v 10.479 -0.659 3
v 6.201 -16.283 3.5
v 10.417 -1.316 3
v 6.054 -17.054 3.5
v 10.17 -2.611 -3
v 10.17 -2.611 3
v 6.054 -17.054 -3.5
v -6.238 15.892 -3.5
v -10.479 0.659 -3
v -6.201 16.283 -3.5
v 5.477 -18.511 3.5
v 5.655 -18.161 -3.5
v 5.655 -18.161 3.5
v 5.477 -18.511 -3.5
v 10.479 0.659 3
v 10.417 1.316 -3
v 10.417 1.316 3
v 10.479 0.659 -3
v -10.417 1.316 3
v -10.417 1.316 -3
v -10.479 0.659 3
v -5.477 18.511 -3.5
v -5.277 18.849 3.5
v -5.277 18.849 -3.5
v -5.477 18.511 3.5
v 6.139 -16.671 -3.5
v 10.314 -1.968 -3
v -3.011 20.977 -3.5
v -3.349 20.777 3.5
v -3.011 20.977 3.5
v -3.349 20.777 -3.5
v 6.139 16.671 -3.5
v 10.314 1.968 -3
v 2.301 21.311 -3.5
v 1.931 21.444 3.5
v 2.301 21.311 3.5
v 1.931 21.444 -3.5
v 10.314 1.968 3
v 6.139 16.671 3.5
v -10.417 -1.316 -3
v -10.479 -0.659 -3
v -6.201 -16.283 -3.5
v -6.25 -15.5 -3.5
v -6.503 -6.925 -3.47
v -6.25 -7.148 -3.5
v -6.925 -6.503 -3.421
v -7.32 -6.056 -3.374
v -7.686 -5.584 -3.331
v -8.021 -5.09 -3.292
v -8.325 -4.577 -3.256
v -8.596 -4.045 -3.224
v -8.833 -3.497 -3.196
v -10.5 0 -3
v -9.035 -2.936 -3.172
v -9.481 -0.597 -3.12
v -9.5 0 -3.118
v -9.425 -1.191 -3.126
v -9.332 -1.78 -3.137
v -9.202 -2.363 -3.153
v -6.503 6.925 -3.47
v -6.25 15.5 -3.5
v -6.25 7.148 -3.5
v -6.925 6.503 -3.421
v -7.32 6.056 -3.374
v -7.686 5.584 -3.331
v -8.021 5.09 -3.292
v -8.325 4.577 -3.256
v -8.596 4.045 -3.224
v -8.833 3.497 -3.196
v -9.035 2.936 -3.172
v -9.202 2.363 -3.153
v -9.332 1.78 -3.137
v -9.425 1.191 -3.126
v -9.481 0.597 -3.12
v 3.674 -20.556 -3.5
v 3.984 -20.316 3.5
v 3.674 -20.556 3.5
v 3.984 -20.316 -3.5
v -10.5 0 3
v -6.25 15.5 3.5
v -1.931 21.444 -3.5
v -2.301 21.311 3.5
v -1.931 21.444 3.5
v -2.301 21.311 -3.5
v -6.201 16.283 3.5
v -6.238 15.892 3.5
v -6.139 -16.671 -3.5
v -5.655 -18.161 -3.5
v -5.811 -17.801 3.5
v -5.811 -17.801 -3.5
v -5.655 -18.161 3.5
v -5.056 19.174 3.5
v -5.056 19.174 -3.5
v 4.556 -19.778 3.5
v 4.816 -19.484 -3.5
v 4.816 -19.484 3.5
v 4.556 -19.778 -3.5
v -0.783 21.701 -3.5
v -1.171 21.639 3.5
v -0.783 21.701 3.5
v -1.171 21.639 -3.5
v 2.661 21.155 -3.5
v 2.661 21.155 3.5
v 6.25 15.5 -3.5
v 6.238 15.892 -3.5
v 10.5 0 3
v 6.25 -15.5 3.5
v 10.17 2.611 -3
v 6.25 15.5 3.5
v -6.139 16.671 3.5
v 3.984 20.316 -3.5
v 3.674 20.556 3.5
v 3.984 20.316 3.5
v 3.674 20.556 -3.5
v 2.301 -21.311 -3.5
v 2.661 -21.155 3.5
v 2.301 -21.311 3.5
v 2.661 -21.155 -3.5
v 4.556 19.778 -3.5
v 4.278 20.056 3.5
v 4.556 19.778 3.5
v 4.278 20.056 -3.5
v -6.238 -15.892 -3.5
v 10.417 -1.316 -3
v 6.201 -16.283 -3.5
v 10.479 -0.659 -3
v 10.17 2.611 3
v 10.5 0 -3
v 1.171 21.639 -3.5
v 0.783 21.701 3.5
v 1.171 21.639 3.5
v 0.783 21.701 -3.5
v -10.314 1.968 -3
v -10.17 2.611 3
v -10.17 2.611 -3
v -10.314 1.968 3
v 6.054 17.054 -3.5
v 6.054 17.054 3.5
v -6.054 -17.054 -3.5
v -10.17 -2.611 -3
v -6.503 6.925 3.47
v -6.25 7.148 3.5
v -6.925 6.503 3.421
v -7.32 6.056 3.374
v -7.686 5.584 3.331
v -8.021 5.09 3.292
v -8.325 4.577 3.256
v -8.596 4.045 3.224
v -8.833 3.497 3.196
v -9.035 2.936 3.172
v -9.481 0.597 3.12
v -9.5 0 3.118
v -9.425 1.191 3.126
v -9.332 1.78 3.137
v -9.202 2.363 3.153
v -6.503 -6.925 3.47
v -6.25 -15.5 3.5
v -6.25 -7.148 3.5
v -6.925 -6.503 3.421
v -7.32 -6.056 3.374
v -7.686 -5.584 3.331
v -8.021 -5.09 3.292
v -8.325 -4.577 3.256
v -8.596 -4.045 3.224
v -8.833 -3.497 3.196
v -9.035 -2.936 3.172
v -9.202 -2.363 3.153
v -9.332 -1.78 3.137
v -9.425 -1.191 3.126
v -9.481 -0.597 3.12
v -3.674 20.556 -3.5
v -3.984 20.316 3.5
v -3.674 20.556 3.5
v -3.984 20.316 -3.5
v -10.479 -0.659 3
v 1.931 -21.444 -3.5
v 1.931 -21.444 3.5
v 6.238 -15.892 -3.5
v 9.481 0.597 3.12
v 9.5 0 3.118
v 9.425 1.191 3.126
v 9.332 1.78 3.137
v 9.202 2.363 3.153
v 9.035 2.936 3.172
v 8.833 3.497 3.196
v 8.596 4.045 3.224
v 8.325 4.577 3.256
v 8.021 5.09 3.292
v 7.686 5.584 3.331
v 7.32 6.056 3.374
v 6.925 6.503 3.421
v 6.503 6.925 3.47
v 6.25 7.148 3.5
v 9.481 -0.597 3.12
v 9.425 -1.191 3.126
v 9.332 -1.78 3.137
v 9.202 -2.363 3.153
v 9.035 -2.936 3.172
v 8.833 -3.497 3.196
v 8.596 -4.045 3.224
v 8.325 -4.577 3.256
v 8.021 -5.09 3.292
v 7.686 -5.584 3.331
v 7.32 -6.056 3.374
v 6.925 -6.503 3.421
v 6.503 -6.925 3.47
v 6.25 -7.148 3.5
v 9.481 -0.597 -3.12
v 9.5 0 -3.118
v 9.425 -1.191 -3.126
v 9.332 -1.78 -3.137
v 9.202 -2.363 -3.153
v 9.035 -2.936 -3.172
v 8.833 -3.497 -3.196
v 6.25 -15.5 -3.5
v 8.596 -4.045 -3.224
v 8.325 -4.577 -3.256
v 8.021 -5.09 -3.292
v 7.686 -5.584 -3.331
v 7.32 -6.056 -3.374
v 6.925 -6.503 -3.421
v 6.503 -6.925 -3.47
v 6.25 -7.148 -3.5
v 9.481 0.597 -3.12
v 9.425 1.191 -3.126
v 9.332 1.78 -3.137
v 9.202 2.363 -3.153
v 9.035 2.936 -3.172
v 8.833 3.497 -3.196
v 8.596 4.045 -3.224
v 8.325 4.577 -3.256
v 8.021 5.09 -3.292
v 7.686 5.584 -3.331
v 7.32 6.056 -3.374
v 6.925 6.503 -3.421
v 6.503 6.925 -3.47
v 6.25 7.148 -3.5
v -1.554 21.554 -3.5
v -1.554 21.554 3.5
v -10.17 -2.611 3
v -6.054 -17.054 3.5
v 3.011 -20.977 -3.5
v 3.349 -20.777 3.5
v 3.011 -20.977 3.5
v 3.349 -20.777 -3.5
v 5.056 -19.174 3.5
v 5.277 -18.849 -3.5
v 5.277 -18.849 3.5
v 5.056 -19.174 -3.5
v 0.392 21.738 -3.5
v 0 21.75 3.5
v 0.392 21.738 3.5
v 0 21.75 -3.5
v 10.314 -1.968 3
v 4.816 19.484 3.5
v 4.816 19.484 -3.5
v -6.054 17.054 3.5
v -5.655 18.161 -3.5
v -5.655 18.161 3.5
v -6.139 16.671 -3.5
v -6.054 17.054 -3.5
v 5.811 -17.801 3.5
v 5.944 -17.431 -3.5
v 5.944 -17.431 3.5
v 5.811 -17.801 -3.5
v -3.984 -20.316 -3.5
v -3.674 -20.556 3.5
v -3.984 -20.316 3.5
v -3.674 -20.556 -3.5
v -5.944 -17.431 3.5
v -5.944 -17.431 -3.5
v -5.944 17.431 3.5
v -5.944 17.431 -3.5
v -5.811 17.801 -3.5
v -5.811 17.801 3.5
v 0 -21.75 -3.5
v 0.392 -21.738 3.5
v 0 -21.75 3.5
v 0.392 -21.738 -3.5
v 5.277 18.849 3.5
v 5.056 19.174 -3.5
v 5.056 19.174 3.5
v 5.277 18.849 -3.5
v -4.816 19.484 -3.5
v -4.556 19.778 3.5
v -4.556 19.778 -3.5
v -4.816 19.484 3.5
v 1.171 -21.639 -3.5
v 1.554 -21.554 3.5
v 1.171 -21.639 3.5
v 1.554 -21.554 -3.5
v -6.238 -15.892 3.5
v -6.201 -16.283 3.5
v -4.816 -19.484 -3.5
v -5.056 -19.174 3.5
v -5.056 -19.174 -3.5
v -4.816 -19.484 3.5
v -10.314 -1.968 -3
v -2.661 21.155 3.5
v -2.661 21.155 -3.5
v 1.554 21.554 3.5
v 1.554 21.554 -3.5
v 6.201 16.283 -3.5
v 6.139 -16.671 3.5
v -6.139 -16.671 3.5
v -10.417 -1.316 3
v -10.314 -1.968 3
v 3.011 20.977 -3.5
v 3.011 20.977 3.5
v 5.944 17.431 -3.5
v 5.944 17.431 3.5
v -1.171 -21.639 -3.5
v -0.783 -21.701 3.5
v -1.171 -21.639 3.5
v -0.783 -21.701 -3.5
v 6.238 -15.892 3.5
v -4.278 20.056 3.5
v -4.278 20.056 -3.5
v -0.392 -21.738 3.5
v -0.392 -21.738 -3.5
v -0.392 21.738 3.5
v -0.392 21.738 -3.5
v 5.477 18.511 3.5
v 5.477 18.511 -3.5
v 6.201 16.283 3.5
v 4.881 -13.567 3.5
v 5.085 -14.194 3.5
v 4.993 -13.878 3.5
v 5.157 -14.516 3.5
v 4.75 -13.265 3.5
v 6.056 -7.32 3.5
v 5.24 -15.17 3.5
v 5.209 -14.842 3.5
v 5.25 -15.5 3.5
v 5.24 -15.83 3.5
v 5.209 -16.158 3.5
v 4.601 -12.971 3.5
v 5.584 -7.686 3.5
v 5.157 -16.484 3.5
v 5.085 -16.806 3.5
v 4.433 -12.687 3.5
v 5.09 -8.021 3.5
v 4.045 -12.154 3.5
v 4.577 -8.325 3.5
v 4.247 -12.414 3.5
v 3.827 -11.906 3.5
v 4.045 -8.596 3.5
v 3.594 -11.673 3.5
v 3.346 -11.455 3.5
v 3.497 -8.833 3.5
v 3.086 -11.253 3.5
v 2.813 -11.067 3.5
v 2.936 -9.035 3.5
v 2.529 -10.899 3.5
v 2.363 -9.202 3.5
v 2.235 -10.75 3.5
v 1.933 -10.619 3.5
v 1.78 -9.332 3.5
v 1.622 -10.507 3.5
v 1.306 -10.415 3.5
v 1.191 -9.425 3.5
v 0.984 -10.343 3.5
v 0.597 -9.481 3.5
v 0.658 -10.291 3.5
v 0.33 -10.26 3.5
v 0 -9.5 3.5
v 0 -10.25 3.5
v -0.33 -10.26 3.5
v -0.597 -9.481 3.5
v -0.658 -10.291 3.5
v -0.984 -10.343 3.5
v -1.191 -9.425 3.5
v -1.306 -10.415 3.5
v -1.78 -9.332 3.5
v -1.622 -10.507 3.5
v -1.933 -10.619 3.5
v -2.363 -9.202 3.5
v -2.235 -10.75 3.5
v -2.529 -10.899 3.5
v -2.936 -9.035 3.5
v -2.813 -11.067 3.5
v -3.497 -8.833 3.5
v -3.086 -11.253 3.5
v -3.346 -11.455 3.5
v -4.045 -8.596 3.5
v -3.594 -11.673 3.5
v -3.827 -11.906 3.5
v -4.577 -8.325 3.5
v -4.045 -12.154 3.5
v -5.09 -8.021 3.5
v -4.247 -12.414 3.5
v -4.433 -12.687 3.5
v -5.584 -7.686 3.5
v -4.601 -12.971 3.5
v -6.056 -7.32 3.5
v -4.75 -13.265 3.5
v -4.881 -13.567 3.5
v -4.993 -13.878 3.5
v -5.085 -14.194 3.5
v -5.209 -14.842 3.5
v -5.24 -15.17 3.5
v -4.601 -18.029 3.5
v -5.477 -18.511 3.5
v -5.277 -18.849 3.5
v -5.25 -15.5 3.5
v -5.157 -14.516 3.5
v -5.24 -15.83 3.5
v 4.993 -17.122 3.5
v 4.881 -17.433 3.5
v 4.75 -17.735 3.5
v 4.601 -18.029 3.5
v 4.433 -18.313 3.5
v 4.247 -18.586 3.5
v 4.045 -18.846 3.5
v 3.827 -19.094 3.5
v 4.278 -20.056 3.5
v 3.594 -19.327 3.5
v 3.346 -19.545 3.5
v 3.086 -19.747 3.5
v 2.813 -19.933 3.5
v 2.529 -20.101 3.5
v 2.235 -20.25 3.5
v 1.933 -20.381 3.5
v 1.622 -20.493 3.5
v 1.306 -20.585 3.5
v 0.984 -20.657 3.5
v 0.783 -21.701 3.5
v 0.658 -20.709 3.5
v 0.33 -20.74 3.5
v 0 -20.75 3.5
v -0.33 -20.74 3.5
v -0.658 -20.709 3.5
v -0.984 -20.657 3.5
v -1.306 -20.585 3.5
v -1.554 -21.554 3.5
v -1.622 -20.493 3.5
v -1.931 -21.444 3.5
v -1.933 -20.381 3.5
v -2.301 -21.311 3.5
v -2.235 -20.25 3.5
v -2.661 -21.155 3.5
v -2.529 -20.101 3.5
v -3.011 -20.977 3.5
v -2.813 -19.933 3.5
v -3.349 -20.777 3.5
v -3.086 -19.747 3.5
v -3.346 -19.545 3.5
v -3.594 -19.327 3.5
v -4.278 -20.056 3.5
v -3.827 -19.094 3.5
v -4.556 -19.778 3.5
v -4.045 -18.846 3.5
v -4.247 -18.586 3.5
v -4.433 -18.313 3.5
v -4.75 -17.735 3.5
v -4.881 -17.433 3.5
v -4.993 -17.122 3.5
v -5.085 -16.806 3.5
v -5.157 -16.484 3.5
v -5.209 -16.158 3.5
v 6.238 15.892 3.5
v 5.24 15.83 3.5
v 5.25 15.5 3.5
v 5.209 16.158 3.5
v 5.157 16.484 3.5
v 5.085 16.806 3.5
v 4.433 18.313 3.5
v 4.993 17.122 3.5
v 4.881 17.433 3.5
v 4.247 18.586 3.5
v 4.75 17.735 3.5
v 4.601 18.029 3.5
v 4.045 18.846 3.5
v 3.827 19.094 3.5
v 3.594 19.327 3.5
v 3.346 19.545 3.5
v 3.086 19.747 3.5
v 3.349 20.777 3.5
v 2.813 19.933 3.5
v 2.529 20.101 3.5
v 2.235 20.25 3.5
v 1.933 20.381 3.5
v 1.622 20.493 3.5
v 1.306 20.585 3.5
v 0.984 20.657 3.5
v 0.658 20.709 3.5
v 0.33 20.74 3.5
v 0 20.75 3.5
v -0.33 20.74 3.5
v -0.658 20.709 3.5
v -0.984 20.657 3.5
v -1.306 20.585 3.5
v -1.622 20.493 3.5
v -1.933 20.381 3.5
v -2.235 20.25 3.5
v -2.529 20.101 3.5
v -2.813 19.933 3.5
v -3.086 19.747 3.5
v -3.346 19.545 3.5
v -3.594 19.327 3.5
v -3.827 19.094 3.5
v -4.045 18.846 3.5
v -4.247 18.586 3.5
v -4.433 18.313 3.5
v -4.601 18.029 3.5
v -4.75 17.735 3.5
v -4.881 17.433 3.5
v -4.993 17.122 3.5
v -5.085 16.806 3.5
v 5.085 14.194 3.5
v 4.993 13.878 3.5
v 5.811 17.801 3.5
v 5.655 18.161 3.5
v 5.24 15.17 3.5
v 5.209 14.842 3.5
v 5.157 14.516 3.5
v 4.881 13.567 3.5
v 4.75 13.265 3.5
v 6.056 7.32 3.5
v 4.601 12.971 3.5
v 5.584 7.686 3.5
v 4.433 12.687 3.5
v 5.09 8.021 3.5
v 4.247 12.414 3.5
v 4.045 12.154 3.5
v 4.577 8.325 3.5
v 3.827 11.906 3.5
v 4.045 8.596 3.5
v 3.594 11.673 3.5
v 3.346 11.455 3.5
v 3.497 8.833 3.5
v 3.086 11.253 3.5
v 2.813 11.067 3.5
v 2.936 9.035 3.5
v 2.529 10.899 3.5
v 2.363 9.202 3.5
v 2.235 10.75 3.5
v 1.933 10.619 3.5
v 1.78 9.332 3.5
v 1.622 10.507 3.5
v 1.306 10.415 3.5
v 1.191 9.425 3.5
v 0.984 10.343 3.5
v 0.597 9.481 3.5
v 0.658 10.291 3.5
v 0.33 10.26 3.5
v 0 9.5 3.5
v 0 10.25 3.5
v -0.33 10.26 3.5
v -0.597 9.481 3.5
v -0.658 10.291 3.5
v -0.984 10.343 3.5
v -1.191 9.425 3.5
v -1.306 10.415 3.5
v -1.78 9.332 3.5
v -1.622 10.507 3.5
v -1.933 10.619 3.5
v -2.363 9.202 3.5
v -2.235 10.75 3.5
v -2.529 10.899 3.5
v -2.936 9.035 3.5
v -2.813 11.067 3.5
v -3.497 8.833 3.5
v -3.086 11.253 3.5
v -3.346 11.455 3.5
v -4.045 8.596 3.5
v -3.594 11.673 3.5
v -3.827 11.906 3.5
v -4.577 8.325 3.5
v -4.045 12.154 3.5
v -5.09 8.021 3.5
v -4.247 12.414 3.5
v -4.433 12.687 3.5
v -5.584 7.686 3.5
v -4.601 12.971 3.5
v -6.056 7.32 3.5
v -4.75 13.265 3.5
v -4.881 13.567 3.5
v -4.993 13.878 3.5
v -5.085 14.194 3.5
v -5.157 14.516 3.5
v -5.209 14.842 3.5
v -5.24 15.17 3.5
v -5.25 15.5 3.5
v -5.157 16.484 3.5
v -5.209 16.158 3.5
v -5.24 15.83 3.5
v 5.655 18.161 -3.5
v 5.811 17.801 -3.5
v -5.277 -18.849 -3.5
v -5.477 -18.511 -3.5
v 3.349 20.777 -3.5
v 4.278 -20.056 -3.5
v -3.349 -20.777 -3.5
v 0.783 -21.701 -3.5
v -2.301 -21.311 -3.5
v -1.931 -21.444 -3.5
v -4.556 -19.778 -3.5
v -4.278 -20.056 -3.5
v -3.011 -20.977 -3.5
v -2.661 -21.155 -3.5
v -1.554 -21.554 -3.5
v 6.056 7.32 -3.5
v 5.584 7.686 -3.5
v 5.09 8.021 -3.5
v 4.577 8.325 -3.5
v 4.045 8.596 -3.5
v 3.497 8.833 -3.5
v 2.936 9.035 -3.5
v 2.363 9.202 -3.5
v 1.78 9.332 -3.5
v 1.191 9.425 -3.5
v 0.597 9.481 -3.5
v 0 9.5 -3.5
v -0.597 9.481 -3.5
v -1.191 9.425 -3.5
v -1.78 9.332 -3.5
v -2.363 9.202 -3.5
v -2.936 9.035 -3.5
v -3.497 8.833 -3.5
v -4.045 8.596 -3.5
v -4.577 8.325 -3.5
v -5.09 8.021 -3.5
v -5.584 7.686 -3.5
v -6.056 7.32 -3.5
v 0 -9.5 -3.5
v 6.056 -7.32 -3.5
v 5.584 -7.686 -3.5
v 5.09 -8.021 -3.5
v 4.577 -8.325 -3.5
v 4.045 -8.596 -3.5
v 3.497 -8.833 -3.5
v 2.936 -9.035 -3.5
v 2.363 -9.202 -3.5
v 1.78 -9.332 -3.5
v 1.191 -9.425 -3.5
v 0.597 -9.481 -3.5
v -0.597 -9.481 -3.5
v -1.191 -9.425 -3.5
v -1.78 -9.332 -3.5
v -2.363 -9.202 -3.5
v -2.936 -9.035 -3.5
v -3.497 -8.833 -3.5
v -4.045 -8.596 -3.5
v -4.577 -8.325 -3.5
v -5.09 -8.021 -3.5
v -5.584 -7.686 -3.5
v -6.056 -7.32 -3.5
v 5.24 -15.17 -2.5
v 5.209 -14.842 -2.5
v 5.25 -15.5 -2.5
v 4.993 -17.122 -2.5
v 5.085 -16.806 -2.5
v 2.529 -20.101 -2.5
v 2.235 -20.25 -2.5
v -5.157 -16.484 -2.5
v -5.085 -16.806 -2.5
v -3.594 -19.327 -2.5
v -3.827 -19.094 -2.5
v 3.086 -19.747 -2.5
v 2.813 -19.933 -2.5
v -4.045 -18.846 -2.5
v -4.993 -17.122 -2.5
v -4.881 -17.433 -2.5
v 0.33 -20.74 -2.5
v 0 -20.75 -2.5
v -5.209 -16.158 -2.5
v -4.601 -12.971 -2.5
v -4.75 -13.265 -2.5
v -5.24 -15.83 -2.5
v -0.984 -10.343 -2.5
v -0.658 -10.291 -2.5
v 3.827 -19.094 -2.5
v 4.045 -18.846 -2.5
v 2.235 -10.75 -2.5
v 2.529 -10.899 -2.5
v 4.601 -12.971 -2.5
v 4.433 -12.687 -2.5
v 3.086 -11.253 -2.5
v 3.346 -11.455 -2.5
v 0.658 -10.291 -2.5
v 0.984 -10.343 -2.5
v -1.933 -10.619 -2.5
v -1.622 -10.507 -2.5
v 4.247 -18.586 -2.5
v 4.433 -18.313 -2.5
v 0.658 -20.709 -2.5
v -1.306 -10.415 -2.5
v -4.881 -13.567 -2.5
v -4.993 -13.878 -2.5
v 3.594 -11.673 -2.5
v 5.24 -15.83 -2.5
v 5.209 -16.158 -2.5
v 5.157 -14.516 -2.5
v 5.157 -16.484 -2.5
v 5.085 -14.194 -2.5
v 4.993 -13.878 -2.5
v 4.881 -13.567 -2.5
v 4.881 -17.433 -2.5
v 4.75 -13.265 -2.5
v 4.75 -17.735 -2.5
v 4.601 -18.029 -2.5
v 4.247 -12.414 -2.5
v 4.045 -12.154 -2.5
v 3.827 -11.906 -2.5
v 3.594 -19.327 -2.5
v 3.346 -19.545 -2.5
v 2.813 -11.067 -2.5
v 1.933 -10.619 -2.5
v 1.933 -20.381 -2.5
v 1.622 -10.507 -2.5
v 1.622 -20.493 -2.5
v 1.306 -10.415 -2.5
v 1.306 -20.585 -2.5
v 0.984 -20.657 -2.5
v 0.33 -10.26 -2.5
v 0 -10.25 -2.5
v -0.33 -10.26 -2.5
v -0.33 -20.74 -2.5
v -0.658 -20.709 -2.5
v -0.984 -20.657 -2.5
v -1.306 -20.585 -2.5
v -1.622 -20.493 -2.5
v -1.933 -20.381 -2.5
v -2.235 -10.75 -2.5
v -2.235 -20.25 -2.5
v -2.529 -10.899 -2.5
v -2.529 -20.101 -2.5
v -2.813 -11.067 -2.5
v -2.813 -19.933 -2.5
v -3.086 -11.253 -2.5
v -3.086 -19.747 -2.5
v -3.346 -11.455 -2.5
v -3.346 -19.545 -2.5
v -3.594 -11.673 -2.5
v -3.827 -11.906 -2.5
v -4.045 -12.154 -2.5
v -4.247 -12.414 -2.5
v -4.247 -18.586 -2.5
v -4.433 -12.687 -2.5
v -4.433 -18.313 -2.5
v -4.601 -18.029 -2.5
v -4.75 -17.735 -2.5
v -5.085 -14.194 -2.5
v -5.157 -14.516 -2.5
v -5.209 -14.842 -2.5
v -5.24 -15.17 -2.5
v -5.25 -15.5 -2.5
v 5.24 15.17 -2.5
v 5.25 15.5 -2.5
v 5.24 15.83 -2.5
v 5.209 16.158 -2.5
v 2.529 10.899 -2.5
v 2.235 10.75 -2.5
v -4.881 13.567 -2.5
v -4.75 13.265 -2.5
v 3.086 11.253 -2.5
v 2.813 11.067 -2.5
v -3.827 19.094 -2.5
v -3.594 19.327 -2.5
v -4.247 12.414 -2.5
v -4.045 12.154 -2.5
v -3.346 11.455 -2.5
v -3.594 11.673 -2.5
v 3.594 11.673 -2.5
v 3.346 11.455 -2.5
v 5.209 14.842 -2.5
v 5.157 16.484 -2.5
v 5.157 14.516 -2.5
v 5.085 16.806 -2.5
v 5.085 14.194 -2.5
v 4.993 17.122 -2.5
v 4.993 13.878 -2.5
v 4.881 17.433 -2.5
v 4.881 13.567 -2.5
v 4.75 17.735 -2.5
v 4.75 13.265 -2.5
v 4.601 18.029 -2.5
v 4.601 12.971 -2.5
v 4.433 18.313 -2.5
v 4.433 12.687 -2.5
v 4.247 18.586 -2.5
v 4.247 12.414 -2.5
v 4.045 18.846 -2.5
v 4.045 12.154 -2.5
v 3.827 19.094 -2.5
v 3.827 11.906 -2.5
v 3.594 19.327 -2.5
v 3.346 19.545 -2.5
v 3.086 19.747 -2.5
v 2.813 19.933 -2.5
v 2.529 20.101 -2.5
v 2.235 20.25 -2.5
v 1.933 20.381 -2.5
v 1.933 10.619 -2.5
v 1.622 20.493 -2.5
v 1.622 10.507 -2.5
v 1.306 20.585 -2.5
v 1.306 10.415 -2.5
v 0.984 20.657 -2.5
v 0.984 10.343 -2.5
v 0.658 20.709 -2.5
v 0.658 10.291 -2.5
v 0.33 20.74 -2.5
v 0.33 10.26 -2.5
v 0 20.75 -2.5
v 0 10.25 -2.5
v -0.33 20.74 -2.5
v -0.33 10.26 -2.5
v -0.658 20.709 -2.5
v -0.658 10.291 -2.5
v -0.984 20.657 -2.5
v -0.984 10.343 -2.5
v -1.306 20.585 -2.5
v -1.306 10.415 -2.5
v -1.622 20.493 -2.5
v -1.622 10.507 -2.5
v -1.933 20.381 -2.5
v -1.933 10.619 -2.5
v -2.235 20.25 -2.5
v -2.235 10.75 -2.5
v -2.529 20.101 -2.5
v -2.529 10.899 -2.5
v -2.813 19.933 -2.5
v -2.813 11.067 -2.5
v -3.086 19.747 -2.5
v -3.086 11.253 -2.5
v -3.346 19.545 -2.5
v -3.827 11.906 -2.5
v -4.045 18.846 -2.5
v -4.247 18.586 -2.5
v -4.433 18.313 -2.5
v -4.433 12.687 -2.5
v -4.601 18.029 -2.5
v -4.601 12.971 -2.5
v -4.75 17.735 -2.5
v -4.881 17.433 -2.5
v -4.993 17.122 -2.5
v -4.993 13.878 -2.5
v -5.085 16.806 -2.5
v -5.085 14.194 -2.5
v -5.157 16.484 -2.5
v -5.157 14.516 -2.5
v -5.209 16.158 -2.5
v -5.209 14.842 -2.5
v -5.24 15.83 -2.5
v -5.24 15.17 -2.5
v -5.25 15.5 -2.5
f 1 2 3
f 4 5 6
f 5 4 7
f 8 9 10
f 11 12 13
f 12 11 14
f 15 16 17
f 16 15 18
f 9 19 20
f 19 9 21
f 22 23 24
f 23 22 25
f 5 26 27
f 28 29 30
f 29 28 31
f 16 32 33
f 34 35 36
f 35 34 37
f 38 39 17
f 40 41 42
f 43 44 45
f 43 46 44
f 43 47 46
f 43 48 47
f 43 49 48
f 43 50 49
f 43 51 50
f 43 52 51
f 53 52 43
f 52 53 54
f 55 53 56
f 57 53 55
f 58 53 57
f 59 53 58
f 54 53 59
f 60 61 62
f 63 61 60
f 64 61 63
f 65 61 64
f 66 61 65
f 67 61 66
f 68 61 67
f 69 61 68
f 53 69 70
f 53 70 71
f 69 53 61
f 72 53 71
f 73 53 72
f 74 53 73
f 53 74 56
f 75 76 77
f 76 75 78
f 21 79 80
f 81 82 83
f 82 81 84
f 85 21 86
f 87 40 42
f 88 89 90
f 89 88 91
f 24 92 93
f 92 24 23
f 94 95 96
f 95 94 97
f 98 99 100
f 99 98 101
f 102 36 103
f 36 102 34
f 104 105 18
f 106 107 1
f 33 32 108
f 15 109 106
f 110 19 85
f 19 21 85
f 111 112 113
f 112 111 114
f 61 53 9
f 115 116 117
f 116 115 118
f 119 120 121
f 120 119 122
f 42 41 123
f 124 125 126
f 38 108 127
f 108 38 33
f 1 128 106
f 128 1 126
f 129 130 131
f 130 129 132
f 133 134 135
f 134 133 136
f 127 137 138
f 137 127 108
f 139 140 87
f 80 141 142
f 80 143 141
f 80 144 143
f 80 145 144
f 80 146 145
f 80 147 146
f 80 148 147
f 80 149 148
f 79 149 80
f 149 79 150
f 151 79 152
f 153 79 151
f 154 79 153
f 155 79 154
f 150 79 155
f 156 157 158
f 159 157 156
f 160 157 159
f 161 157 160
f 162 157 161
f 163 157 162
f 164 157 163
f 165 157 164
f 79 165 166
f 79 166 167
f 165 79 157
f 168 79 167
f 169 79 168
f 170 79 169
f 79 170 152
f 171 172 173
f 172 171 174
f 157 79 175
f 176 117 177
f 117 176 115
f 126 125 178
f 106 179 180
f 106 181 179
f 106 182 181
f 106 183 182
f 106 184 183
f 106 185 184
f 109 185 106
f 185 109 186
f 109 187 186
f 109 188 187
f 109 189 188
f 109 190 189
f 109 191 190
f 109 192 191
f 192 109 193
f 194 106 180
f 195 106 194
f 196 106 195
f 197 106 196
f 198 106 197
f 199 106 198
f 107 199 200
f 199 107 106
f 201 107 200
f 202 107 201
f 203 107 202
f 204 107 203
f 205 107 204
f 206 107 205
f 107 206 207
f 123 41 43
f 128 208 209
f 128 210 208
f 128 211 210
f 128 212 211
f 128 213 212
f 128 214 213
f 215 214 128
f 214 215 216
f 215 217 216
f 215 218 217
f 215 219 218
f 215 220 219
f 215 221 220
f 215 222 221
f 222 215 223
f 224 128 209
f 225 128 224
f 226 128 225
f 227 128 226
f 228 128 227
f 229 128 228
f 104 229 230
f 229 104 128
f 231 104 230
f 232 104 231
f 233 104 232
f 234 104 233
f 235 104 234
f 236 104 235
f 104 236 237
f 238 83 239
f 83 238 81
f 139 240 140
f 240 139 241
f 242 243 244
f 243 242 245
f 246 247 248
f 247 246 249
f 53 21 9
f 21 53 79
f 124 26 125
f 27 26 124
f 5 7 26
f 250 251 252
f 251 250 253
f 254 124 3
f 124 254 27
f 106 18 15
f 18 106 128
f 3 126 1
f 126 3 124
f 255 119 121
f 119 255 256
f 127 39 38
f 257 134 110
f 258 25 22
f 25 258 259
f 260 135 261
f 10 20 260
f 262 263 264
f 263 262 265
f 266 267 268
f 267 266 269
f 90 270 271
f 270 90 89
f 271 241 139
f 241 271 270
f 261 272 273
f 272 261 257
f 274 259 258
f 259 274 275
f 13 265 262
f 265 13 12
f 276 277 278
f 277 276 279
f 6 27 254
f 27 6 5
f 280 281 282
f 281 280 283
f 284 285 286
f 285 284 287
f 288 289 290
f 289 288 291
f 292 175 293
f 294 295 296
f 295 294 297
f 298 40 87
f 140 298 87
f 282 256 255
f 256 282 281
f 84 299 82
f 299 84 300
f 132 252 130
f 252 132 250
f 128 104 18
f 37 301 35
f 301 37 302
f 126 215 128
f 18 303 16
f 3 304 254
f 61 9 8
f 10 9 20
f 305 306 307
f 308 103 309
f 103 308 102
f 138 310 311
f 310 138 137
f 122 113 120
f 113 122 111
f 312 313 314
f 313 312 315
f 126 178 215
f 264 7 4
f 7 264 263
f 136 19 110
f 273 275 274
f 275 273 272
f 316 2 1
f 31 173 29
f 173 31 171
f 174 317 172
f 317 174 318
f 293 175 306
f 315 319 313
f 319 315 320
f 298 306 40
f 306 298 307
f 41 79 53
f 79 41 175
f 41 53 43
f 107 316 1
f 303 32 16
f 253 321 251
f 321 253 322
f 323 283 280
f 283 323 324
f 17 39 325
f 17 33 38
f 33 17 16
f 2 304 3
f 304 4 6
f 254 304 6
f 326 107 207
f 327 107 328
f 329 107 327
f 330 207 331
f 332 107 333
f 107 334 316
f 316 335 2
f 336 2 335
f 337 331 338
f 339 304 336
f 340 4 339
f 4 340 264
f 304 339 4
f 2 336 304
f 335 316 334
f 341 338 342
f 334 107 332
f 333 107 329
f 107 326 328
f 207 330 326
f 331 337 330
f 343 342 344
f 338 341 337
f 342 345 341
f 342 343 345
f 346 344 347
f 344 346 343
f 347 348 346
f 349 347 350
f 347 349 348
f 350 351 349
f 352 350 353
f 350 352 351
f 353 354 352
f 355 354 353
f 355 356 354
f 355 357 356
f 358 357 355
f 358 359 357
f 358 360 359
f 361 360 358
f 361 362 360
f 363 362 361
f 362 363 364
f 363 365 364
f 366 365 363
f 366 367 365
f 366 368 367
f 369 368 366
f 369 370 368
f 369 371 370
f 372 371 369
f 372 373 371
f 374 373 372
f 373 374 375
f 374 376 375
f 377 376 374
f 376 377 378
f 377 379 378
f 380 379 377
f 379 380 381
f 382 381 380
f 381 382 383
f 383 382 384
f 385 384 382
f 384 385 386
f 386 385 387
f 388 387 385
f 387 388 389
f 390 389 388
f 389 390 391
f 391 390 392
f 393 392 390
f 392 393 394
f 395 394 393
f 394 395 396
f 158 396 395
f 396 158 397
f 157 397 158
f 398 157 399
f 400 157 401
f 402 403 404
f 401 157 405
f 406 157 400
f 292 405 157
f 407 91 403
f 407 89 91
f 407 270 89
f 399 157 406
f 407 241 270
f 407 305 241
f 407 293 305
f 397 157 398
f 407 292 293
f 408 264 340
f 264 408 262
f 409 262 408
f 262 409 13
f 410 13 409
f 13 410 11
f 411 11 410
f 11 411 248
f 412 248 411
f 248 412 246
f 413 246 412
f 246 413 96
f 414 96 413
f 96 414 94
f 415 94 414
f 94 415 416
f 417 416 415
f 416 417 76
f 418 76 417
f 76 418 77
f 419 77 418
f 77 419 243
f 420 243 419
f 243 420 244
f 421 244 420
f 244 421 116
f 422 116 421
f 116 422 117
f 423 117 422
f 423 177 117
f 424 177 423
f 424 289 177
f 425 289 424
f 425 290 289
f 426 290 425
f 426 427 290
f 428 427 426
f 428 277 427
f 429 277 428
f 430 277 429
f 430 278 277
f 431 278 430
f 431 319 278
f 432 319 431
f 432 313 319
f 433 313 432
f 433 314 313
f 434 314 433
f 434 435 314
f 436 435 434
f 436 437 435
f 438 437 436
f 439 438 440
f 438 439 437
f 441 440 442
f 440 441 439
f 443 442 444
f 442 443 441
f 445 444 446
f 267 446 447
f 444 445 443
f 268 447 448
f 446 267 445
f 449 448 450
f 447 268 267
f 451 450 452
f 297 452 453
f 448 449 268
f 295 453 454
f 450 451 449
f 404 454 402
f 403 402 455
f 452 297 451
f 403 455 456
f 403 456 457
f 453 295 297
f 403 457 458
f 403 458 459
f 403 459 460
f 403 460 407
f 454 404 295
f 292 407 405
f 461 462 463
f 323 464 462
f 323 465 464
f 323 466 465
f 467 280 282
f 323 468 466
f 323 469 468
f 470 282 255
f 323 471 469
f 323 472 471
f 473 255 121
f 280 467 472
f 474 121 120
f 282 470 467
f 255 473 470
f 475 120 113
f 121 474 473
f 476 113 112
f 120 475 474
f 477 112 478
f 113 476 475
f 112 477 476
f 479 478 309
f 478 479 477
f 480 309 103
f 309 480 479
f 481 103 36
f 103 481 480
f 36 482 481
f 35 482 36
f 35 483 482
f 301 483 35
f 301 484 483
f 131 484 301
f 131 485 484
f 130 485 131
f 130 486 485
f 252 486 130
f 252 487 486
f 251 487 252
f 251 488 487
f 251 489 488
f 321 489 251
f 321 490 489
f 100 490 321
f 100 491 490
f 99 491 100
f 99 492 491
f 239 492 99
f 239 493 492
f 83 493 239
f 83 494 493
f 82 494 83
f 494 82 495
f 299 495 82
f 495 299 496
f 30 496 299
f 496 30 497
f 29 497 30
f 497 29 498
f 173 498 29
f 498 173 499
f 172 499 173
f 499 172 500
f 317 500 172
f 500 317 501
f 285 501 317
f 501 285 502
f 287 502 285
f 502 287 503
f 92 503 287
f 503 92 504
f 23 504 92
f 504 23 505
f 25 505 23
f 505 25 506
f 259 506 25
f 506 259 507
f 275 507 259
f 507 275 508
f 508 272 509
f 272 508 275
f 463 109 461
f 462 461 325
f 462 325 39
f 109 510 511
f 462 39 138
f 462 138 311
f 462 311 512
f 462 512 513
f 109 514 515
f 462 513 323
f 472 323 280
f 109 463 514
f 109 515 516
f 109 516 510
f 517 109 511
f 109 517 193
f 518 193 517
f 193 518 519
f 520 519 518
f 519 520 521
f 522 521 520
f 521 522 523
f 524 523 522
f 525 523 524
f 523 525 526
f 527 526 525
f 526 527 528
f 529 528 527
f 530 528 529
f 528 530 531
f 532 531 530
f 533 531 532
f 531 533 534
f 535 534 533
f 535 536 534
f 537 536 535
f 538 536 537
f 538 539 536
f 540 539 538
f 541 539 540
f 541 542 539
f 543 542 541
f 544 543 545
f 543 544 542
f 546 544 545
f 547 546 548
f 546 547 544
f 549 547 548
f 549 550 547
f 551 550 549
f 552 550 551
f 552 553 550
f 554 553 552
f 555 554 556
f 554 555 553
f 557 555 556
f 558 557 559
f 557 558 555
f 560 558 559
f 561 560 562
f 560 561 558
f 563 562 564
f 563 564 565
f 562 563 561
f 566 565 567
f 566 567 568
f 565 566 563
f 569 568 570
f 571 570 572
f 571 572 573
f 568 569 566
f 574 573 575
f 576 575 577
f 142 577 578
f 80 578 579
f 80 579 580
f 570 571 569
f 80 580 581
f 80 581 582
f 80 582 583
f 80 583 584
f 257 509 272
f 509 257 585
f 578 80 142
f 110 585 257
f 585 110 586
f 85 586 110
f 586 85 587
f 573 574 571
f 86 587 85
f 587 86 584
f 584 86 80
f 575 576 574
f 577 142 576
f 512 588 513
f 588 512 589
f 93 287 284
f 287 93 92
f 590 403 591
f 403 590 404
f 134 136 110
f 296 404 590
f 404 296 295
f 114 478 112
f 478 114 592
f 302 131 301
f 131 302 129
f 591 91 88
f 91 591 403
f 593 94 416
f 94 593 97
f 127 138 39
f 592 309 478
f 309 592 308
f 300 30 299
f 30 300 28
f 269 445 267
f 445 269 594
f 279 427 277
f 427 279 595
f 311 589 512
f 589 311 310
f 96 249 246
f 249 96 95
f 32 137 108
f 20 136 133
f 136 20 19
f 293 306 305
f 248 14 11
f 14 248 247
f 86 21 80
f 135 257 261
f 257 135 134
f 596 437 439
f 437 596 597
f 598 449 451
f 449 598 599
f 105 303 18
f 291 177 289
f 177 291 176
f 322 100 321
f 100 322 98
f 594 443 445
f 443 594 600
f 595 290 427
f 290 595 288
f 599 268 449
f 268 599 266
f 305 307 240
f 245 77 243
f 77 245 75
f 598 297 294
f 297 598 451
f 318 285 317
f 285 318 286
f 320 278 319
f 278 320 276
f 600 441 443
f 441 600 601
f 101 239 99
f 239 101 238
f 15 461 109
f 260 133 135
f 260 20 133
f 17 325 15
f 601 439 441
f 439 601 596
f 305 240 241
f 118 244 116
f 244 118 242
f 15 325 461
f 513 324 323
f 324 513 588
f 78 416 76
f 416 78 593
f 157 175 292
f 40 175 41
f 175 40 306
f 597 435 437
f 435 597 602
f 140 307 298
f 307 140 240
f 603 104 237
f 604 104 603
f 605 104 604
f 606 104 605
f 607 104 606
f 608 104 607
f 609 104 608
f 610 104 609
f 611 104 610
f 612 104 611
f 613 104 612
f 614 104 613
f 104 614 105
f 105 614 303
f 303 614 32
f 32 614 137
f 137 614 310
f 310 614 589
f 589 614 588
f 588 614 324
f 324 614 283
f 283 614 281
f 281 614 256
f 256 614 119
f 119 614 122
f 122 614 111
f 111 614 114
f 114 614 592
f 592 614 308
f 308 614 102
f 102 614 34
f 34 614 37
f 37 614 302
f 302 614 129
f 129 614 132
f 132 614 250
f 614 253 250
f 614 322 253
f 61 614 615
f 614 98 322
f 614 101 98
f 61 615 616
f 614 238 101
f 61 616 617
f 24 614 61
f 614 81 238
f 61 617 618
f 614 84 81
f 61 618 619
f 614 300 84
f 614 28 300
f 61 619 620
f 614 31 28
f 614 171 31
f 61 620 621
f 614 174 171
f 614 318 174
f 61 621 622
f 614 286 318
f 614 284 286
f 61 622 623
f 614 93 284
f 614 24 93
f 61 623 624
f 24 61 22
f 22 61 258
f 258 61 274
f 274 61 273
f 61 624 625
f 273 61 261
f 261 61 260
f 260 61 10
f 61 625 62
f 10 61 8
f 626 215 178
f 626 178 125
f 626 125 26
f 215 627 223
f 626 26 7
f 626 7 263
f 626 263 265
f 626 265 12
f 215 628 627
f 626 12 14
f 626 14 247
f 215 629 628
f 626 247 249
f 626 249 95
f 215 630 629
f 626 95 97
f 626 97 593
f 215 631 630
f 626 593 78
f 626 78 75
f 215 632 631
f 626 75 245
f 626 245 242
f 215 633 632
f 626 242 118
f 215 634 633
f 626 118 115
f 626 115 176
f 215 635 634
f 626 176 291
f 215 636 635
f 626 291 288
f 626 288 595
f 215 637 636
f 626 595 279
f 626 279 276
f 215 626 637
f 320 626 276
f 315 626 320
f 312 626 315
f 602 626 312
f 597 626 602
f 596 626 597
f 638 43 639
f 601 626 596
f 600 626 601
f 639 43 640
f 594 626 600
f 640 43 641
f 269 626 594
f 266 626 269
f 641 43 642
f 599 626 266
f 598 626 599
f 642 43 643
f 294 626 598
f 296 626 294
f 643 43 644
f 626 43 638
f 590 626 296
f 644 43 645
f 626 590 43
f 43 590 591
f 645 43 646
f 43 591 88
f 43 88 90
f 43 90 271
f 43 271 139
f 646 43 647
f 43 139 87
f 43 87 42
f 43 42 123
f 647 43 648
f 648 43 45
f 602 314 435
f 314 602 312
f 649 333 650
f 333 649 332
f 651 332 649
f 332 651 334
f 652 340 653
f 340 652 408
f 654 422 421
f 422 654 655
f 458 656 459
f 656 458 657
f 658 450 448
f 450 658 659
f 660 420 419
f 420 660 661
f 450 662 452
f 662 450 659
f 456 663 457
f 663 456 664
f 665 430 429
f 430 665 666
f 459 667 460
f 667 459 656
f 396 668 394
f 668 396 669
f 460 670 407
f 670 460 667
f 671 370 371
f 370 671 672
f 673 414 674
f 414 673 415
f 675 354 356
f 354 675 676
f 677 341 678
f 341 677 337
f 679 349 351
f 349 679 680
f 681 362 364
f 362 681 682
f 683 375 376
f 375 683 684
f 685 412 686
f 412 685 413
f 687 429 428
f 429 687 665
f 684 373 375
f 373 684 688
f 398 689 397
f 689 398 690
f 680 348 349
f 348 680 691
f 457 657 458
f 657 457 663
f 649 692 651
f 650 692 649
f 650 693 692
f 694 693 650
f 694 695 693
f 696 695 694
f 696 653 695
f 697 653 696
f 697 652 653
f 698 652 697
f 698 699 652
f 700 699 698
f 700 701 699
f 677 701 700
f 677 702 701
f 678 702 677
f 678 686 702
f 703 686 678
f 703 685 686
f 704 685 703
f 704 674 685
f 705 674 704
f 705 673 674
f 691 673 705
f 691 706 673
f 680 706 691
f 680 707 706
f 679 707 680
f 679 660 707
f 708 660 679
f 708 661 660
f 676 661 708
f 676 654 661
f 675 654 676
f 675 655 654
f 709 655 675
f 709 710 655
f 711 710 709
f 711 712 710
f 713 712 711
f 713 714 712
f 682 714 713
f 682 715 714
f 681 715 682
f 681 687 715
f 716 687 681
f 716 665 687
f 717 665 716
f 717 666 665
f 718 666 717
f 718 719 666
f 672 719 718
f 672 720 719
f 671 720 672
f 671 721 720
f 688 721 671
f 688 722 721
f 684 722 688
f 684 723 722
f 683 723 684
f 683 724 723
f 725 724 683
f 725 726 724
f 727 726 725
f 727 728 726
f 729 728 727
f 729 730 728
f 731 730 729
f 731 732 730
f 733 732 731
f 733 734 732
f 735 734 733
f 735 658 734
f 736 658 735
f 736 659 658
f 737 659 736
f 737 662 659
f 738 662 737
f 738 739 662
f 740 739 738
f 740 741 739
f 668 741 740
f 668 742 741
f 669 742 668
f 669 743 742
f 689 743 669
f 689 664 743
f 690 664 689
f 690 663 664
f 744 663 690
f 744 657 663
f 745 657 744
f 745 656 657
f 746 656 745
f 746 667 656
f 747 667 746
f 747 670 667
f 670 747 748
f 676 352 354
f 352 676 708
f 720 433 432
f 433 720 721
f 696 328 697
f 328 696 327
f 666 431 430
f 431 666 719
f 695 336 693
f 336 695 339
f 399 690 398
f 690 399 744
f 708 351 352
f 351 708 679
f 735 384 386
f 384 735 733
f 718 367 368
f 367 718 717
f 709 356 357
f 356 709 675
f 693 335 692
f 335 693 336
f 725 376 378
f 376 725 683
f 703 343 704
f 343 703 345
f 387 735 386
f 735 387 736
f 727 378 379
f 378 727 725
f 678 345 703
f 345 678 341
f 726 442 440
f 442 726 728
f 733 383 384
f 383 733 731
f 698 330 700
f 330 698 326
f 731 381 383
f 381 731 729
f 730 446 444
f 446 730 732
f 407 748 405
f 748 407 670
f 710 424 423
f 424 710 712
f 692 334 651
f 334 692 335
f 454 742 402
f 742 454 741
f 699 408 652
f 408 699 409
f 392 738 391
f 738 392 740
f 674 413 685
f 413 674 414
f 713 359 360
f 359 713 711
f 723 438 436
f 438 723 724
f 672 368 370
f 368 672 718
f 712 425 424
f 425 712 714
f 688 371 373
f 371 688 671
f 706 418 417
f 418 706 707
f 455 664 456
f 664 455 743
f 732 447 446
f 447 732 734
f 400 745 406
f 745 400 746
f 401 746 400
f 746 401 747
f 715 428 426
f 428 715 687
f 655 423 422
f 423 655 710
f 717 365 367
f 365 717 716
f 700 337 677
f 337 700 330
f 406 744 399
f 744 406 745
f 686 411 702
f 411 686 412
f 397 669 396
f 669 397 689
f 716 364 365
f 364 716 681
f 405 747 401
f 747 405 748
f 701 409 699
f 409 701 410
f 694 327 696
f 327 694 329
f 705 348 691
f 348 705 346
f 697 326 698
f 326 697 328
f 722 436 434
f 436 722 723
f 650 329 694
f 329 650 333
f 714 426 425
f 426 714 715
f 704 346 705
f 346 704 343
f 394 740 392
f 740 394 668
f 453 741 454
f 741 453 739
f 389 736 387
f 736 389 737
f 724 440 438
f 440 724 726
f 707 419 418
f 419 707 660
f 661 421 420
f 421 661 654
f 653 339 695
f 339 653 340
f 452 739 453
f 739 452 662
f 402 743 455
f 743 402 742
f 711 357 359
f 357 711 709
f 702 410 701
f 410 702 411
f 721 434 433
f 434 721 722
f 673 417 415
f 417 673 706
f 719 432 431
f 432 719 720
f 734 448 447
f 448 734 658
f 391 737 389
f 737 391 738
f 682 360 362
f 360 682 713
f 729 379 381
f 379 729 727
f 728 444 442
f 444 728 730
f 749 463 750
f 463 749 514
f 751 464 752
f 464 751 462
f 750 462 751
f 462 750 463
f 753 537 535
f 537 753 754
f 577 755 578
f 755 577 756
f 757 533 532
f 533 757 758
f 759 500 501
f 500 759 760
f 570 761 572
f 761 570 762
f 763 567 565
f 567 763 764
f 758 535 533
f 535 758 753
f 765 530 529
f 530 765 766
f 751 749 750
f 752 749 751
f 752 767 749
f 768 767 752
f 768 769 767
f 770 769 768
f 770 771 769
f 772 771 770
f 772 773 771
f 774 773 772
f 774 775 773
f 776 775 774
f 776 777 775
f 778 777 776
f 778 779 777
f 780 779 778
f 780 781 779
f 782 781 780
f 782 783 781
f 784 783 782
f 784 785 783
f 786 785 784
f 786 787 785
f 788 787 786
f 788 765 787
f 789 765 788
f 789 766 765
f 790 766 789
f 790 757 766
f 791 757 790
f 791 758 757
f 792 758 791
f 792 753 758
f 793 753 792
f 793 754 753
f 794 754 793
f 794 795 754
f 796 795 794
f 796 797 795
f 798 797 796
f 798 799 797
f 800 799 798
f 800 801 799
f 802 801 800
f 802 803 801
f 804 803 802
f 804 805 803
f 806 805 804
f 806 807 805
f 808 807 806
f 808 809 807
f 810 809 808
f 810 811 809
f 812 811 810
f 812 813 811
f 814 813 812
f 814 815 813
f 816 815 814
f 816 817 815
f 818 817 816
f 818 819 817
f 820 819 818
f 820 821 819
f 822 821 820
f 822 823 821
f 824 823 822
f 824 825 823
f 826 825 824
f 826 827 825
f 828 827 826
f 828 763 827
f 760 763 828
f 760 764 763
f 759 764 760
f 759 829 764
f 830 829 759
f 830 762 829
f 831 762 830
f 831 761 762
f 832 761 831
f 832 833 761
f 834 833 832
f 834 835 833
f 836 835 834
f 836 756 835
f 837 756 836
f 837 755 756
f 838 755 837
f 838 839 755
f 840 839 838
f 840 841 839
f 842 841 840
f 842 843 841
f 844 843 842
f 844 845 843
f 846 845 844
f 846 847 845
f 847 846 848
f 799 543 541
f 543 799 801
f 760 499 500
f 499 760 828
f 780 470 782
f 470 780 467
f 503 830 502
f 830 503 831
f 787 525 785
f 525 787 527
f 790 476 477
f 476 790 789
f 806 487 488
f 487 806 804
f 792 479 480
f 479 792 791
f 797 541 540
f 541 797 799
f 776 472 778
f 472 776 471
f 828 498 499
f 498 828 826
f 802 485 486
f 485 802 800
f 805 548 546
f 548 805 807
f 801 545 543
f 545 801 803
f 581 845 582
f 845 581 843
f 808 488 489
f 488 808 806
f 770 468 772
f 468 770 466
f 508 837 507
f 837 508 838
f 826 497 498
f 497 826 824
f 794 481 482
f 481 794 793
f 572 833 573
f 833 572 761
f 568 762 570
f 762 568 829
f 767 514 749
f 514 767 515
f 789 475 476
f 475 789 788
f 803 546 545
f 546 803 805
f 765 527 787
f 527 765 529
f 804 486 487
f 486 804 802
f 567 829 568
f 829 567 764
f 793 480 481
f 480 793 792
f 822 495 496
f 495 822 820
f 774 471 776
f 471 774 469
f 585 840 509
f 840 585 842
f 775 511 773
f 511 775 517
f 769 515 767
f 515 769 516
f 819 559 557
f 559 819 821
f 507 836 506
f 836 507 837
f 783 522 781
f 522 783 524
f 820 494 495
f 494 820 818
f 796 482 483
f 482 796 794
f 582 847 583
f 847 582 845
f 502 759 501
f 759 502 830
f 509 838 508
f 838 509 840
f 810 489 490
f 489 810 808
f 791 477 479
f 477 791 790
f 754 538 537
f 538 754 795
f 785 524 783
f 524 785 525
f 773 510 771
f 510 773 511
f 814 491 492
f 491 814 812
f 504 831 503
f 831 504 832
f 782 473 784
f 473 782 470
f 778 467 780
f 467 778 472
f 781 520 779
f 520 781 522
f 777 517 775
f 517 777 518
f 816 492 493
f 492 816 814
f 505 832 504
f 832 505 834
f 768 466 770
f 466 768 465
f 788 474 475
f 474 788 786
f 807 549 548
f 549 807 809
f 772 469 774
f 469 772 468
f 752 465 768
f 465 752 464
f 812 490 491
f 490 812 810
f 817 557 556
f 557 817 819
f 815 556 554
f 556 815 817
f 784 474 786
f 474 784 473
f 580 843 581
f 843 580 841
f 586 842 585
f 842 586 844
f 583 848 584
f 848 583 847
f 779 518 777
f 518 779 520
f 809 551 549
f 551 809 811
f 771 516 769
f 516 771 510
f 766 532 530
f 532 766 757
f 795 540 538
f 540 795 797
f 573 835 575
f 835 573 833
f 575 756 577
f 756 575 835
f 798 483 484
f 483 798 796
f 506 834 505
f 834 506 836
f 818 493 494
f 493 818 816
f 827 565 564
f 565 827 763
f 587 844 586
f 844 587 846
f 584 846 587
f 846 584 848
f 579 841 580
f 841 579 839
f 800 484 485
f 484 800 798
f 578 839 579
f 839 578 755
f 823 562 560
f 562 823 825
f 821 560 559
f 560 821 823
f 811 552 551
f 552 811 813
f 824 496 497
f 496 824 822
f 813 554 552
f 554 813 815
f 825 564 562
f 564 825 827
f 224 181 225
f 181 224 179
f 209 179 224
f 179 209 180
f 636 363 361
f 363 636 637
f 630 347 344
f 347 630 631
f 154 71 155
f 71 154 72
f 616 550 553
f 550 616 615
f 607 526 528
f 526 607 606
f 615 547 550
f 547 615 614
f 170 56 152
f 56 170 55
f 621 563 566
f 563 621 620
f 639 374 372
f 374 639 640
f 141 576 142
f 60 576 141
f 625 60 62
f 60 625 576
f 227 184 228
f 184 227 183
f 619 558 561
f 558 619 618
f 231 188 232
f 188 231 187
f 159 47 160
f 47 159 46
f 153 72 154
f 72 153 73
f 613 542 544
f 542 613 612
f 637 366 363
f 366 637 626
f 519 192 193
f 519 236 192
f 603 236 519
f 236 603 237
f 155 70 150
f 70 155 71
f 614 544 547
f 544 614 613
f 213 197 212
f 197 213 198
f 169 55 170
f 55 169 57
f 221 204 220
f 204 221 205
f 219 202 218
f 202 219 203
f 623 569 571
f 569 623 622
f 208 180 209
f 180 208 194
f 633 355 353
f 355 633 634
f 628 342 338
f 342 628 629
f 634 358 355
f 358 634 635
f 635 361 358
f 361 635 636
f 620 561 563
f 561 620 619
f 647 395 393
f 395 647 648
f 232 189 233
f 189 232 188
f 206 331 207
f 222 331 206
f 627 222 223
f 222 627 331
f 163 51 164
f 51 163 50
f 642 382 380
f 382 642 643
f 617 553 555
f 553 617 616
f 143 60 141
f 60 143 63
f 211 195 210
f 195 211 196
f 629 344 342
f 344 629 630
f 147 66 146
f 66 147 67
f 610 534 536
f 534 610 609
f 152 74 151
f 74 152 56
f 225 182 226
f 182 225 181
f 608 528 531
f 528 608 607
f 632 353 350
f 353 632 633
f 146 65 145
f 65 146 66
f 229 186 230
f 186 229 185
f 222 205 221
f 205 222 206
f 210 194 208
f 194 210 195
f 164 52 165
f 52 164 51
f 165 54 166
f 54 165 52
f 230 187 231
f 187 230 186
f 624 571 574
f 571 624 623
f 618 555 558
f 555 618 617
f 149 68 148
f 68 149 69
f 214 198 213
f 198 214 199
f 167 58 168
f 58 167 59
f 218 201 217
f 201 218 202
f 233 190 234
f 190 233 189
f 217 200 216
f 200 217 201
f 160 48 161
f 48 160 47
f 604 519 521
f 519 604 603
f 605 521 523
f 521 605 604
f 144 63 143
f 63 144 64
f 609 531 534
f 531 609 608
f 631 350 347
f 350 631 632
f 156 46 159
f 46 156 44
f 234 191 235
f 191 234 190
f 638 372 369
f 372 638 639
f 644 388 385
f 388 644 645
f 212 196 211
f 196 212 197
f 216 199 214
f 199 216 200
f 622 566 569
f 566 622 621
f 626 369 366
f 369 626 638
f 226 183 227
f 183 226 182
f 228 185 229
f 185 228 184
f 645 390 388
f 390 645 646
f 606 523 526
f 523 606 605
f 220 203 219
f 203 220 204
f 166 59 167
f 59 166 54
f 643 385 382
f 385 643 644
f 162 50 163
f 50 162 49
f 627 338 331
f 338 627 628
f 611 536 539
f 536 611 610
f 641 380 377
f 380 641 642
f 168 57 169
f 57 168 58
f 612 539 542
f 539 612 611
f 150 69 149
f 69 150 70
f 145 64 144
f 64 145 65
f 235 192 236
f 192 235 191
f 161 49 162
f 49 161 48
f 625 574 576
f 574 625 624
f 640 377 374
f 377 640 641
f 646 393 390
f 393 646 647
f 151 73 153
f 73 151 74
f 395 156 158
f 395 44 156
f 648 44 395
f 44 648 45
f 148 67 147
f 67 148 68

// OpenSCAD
// The physical dimensions are all in mm and located at the end of the file.

// Substract the Ring base (Outer diameter of the finger hole and magnet holders) and the actual inner hole and magnet sizes

difference()
{
    // Hull the ring base and the 2 magnet holders
    hull()
    {
        // Create cylinder with dimensions of the outer diameter of the ring
        cylinder(h=ring_h/2, d1= ring_od, d2=ring_od, center=true); 
        
        // Create two cylinders with outer dimensions of the magnets and move them to the sides
        translate([0,((ring_od/2)+(mag_d_out/2)),0])
        {
            cylinder(h=mag_h+2, d1=1.05*mag_d_out+2, d2=1.05*mag_d_out+2, center=true);
        }
        
        translate([0,-((ring_od/2)+(mag_d_out/2)),0])
        {
            cylinder(h=mag_h+2, d1=1.05*mag_d_out+2, d2=1.05*mag_d_out+2, center=true);
        }
    }
    
    // Magnet Holder 1 translated
    translate([0,-((ring_od/2)+(mag_d_out/2)),-mag_h/2])
    {
        cylinder(h=mag_h+10, d1=1.05*mag_d_out, d2=1.05*mag_d_out);
    }
    
    // Magnet Holder 2 translated
    translate([0,((ring_od/2)+(mag_d_out/2)),-mag_h/2])
    {
        cylinder(h=mag_h+10, d1=1.05*mag_d_out, d2=1.05*mag_d_out);
    }
   
    
    // Finger Hole
    cylinder(h=ring_h/2+1, d1= ring_id, d2=ring_id, center=true);
}

// Base ring dimensions
// Inner diameter
ring_id = 19;
// Outer diameter
ring_od = 21;
// Ring height
ring_h = 12;

// Magnet Dimensions
// Magnet outer diameter
mag_d_out = 10;
// Magnet heigth
mag_h = 5;

// Number of sides on "round" things. (e.g., $fn=5 would make a pentagon instead of a circle)
$fn=100;
